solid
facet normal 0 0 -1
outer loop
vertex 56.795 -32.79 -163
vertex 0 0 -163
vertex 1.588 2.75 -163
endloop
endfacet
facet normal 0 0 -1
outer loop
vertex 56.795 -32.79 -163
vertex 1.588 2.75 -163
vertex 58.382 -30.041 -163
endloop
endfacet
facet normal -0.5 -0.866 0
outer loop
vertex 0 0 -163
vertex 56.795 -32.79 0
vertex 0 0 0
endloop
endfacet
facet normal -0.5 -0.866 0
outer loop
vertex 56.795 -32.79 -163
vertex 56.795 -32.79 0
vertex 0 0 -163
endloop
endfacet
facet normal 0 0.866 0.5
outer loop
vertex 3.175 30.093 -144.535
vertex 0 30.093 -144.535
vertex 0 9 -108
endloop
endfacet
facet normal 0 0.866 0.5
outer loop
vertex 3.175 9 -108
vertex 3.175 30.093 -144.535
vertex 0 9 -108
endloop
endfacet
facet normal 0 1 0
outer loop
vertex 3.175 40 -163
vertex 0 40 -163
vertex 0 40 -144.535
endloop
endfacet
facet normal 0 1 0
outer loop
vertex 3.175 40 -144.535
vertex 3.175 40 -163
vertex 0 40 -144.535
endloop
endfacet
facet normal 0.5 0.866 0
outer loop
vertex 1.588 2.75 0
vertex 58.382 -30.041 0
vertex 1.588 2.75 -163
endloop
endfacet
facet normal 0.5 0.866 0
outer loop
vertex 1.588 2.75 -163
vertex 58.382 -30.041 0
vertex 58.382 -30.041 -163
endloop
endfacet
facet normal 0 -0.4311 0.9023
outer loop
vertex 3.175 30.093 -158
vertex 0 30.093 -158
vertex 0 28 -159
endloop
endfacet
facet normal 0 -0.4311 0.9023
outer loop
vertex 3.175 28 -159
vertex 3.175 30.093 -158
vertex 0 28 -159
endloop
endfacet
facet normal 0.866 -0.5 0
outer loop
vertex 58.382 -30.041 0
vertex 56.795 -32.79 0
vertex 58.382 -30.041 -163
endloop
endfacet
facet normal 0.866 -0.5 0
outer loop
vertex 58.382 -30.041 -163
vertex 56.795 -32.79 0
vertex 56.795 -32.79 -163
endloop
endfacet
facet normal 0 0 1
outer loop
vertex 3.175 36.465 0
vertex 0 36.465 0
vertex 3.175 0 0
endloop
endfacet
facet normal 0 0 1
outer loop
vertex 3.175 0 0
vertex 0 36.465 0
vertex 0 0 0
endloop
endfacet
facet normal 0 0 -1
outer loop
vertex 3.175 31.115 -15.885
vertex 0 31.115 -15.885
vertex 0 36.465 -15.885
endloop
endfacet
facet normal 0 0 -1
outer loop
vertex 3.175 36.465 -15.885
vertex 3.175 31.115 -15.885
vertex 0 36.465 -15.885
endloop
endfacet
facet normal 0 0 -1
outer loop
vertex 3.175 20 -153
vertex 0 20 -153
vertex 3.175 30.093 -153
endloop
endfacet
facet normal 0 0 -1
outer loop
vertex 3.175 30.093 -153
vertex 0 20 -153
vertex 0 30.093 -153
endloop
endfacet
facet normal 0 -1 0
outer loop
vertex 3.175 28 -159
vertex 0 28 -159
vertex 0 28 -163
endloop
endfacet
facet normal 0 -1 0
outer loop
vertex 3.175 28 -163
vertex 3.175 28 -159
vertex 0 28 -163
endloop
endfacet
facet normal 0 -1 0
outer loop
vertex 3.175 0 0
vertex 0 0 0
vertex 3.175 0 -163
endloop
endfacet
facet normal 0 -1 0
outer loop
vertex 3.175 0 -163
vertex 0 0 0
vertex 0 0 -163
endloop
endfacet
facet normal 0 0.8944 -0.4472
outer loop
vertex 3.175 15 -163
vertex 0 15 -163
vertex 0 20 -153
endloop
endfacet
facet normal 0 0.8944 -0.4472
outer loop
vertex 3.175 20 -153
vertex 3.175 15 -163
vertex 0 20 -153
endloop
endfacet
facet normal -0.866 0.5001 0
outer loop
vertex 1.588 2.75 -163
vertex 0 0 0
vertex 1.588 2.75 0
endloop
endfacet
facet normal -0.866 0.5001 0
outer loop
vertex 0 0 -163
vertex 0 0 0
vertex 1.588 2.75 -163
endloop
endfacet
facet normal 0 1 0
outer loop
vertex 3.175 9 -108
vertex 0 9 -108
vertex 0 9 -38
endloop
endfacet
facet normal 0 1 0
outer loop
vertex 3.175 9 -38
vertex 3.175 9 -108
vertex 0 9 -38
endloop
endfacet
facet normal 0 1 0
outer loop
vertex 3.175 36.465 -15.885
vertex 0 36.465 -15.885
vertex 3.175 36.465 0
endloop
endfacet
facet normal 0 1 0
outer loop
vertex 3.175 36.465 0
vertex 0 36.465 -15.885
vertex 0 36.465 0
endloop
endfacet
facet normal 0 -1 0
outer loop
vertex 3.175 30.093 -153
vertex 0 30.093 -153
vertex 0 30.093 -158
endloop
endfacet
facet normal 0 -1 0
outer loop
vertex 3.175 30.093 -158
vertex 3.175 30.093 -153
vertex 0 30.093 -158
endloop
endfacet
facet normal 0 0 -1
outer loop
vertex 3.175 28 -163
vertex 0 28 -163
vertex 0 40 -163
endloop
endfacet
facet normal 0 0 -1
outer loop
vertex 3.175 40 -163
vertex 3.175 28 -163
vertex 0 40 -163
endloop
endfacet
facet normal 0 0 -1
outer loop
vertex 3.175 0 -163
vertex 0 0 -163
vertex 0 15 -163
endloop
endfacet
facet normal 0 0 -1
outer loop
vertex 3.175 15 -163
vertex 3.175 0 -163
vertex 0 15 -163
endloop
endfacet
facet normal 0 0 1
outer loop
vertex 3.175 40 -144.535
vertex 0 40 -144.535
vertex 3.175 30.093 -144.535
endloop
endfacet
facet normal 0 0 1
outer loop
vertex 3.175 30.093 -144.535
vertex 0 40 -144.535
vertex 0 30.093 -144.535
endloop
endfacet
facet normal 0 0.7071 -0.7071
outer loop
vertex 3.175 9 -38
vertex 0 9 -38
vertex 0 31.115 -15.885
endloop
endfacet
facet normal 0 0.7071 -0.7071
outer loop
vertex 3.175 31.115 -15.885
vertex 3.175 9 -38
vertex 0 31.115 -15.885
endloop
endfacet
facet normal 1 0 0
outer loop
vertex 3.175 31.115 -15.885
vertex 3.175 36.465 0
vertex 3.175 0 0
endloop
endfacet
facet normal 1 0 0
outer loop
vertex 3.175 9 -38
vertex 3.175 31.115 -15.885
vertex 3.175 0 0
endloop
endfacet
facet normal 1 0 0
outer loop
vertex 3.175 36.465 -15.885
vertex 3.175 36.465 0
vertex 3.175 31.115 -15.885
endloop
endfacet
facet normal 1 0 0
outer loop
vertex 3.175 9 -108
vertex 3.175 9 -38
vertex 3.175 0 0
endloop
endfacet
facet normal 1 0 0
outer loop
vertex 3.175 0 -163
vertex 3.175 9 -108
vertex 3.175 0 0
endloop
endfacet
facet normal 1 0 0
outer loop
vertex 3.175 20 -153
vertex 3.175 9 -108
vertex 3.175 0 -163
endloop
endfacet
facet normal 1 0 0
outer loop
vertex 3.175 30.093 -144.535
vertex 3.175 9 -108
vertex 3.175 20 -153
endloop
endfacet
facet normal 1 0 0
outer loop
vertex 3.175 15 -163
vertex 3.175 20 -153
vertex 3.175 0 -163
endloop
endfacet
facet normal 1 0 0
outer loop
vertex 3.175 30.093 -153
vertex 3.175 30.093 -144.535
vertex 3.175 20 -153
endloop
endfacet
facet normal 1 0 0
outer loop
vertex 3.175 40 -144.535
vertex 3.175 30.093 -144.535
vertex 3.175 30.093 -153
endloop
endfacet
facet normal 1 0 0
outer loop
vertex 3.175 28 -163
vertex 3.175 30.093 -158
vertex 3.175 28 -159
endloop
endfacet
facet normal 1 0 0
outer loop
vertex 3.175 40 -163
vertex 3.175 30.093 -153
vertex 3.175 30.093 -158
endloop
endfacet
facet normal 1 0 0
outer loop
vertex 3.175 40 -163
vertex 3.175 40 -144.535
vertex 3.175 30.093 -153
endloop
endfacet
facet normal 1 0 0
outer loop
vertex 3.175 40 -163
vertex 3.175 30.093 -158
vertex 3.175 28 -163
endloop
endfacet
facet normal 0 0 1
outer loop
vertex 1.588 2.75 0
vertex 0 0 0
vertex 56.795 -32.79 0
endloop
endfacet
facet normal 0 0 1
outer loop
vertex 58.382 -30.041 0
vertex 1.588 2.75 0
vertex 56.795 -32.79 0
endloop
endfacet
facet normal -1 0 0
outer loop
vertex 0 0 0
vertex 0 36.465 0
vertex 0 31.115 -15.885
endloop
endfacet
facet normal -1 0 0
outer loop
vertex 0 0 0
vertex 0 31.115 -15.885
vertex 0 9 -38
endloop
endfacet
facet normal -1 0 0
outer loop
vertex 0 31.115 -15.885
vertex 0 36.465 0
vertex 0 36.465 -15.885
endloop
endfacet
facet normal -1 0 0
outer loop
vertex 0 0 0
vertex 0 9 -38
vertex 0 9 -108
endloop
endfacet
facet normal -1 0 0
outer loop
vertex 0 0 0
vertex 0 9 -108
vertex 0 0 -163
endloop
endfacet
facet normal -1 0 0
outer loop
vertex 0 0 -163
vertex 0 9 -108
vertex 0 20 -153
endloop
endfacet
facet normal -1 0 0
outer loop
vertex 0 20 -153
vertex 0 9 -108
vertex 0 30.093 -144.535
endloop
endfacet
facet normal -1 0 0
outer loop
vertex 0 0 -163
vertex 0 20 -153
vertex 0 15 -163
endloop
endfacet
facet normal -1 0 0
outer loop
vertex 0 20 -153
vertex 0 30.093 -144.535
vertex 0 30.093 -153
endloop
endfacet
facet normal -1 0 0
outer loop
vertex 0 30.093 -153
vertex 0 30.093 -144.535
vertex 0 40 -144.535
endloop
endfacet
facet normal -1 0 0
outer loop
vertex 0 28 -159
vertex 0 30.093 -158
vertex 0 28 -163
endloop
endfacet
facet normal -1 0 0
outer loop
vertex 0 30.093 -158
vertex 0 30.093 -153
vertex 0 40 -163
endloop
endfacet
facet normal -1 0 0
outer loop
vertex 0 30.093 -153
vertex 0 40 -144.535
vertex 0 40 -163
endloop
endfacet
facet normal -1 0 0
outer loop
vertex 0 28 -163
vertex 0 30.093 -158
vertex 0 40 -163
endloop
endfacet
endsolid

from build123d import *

# Parameters (mm, degrees)
BOSS_EXTRUDE1_DEPTH = 3.175
SKETCH11_W          = 163
SKETCH11_H          = 65.580816733
BOSS_EXTRUDE2_DEPTH = 3.175


with BuildPart() as part:
    # Sketch10 → Boss-Extrude1 (new body)
    with BuildSketch(Plane(origin=(0, 0, 0), x_dir=(0, 0, -1), z_dir=(1, 0, 0))):
        Polygon((15.884918301, 36.464807754), (0, 36.464807754), (0, 0), (163, 0), (163, 15), (153, 20), (153, 30.093444916), (158, 30.093444916), (159, 28), (163, 28), (163, 40), (153, 40), (144.534918301, 40), (144.534918301, 36.464807754), (144.534918301, 30.093444916), (108, 9), (38, 9), (15.884918301, 31.115081699), align=None)
    extrude(amount=BOSS_EXTRUDE1_DEPTH)


with BuildPart() as body_2:
    # Sketch11 → Boss-Extrude2 (new body)
    with BuildSketch(Plane(origin=(0, 0, 0), x_dir=(0, 0, -1), z_dir=(-0.5, -0.866025404, 0))):
        with Locations((81.5, 32.790408367)):
            Rectangle(SKETCH11_W, SKETCH11_H)
    extrude(amount=-BOSS_EXTRUDE2_DEPTH)


solid = Compound([part.part, body_2.part])
